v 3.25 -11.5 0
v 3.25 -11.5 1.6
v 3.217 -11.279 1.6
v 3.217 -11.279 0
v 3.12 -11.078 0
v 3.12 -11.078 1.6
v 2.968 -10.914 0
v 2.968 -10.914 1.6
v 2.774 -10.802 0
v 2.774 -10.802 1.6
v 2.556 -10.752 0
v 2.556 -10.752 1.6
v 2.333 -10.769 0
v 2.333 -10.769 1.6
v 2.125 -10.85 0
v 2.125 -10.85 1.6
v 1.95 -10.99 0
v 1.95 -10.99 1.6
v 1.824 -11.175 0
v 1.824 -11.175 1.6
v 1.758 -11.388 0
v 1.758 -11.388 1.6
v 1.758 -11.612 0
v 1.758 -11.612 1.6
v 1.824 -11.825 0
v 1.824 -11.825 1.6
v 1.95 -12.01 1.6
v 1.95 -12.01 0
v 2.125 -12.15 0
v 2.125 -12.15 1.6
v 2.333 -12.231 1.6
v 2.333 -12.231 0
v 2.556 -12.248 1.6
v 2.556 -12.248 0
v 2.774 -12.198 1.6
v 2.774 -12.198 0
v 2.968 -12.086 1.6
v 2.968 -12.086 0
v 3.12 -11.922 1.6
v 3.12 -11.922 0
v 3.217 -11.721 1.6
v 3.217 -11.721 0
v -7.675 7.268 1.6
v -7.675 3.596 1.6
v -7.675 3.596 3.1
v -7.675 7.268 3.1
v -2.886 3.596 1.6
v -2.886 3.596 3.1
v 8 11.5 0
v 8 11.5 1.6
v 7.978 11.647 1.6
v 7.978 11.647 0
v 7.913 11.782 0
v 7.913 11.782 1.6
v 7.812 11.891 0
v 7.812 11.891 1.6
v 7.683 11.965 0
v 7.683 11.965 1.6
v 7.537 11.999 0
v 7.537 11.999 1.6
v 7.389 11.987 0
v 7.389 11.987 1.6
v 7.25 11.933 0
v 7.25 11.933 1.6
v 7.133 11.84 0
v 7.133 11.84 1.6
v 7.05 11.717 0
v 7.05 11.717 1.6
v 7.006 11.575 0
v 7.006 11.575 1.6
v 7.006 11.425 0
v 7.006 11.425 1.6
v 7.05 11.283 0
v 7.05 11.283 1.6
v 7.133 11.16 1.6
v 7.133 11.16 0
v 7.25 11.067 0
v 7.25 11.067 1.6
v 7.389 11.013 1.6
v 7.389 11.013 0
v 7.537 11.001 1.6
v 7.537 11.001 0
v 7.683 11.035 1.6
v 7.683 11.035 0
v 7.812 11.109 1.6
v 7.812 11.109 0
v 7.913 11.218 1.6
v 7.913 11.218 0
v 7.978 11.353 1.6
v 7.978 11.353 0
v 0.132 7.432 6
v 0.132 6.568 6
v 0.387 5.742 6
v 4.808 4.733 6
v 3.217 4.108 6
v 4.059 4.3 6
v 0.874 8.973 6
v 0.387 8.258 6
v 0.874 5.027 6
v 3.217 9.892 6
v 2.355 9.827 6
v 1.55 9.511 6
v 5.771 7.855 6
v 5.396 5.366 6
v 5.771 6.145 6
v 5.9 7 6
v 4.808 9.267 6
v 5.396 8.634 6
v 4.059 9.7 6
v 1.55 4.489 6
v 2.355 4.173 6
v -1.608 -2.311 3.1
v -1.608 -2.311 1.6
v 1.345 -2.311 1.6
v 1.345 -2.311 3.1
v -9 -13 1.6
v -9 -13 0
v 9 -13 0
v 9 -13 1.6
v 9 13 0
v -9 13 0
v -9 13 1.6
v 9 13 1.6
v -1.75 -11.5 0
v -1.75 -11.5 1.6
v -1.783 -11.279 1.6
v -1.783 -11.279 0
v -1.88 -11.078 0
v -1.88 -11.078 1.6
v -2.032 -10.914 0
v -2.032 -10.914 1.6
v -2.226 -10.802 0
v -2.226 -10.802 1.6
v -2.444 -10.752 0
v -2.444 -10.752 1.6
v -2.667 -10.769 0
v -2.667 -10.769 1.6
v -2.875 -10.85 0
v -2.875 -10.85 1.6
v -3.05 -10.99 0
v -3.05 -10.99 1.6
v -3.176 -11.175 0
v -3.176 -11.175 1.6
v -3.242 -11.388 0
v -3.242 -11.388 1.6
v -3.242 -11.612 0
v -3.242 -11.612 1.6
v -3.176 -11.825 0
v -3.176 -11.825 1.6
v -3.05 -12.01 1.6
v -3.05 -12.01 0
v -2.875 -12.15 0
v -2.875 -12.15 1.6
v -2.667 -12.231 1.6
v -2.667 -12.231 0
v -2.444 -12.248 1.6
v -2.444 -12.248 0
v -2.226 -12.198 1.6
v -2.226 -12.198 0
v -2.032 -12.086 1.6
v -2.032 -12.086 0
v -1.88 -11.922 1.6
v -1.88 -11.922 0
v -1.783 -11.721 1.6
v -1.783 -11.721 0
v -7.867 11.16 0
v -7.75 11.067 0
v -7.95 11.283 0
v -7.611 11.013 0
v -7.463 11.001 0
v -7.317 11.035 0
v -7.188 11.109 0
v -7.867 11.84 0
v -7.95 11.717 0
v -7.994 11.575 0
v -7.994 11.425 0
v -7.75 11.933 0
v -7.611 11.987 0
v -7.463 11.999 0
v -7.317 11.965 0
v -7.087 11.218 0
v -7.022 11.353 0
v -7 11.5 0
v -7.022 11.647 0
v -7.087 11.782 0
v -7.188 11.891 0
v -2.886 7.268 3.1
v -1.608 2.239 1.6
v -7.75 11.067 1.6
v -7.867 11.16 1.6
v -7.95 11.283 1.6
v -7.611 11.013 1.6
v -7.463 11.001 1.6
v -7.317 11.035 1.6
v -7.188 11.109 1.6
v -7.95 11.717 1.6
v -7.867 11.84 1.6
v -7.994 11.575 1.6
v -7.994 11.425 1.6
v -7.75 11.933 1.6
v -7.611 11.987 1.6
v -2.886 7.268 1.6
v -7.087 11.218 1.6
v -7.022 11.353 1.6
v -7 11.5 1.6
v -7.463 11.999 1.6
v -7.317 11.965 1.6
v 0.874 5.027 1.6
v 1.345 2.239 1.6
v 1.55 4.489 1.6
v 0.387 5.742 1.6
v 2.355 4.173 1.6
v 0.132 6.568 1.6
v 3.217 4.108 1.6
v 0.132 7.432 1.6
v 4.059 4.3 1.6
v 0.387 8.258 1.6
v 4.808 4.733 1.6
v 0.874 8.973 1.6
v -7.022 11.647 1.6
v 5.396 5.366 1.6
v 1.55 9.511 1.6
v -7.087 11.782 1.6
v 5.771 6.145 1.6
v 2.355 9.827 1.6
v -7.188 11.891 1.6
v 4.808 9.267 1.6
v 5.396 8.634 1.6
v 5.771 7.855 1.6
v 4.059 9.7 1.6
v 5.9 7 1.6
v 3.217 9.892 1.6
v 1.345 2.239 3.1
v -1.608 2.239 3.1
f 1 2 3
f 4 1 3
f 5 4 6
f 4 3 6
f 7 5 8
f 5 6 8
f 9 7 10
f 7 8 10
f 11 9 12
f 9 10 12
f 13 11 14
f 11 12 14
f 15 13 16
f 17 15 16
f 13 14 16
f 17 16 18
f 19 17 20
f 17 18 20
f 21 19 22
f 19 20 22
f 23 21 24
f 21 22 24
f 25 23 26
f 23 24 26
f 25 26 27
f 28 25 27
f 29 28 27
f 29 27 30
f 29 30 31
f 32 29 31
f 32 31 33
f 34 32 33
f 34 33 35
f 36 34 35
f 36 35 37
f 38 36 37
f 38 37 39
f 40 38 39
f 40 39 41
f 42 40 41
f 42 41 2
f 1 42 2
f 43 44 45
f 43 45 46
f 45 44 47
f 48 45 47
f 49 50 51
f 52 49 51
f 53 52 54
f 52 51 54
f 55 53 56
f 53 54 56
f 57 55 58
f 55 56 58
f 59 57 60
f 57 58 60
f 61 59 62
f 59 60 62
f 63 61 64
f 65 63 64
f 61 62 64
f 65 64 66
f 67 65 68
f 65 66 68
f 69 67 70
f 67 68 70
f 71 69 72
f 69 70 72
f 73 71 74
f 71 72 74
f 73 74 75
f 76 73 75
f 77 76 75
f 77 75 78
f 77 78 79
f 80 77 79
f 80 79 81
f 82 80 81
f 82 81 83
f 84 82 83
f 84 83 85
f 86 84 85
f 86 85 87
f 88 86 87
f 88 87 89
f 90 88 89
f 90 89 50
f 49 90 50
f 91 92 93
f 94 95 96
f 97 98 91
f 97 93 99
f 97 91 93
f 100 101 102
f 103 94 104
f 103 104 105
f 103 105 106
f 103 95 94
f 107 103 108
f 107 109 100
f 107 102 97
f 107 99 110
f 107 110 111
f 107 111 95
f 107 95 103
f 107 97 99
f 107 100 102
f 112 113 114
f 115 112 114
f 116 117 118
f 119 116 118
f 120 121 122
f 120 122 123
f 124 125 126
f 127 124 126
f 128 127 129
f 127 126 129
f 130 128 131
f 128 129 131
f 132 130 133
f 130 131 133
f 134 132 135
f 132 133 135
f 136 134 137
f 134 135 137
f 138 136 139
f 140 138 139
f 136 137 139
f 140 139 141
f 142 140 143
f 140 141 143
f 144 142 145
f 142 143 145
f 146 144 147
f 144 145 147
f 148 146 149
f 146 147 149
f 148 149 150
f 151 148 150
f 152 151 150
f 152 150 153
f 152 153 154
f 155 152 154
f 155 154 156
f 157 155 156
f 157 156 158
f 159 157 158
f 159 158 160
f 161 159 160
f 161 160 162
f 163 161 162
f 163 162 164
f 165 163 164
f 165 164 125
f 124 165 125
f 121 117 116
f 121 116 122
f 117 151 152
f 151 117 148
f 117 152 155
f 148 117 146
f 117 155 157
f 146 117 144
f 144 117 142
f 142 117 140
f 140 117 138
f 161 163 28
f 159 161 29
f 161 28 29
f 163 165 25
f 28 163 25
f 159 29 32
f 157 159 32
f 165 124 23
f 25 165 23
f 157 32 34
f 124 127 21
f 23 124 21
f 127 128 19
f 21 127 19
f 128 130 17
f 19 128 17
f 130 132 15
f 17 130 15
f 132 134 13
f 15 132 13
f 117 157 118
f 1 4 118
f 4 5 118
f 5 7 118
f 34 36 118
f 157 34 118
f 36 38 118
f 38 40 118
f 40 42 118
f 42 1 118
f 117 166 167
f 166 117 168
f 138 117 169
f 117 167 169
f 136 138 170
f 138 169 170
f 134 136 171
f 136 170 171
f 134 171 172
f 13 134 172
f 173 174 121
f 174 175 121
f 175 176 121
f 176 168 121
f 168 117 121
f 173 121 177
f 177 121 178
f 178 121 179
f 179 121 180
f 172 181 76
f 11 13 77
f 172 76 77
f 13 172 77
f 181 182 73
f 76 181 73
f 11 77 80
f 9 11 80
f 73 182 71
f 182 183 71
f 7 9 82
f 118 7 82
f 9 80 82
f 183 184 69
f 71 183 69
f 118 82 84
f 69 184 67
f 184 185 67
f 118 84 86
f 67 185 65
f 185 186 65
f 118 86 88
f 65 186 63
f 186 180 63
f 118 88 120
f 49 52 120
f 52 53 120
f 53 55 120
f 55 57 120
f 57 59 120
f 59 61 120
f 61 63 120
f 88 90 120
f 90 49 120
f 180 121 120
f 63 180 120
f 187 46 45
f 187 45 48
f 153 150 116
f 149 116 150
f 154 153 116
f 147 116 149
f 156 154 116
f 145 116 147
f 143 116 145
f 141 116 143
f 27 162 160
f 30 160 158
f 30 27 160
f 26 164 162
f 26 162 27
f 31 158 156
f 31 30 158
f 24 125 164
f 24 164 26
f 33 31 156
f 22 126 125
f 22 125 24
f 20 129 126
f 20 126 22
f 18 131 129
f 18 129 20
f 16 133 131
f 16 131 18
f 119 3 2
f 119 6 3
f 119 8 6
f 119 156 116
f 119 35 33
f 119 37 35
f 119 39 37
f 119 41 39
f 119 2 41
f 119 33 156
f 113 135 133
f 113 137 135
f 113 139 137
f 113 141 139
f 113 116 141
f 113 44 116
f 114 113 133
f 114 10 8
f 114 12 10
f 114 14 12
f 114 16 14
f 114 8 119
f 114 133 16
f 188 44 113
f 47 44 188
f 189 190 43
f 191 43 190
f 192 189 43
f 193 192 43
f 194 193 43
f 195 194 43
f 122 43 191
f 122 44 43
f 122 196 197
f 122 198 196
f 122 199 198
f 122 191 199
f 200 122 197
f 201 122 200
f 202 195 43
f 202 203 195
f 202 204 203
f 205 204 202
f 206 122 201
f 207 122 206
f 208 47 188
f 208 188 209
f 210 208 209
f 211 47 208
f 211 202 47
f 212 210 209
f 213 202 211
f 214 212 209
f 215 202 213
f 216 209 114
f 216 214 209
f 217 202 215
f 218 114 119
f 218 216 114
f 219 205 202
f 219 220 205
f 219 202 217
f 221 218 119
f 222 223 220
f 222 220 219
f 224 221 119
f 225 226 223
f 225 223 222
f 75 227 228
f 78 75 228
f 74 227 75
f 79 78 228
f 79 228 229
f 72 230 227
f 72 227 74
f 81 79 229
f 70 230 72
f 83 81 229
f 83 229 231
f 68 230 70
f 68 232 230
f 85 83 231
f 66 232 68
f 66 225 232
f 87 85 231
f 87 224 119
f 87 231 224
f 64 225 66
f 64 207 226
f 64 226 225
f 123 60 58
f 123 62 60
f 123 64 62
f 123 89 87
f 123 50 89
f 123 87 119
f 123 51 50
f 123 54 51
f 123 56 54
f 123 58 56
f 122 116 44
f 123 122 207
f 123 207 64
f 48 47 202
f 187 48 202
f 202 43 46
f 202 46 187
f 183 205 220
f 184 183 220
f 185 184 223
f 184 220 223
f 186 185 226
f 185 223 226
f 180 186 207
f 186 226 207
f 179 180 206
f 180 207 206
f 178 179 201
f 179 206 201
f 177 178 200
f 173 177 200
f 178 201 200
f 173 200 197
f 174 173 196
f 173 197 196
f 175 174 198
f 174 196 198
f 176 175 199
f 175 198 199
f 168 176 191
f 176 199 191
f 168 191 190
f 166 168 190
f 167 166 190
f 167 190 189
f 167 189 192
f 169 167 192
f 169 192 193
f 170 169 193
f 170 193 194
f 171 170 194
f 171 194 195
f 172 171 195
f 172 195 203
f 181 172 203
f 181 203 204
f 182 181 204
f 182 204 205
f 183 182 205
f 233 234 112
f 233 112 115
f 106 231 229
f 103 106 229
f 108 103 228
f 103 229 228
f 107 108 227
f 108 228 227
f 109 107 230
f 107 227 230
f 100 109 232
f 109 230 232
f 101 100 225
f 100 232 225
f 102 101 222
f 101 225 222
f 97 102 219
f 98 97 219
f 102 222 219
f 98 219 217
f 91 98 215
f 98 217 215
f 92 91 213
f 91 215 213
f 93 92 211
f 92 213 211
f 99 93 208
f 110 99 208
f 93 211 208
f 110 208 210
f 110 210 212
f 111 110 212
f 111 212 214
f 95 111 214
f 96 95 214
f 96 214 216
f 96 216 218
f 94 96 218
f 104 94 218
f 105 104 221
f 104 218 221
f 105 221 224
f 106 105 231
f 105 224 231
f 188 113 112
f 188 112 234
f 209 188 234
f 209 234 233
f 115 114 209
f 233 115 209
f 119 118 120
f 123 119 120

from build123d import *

# Parameters (mm, degrees)
F0_W     = 18
F0_H     = 26
F1_DEPTH = 1.6
F2_R     = 2.9
F3_DEPTH = 4.4
F4_W     = 4.789572
F4_H     = 3.672005
F4_W_2   = 2.95357
F4_H_2   = 4.550093
F5_DEPTH = 1.5
F6_R     = 0.75
F6_R_2   = 0.5
F7_DEPTH = 25


with BuildPart() as f1:
    # F0 (on Top) → F1 (new body)
    with BuildSketch(Plane.XY):
        Rectangle(F0_W, F0_H)
    extrude(amount=F1_DEPTH)

    # F2 (on face) → F3 (join)
    with BuildSketch(Plane.XY.offset(1.6)):
        with Locations((3, 7)):
            Circle(F2_R)
    extrude(amount=F3_DEPTH)

    # F4 (on face) → F5 (join)
    with BuildSketch(Plane.XY.offset(1.6)):
        with Locations((-5.280366, 5.431945)):
            Rectangle(F4_W, F4_H)
        with Locations((-0.131576, -0.03615)):
            Rectangle(F4_W_2, F4_H_2)
    extrude(amount=F5_DEPTH)

    # F6 (on face) → F7 (cut)
    with BuildSketch(Plane.XY.offset(1.6)):
        with Locations((-2.5, -11.5)):
            Circle(F6_R)
        with Locations((2.5, -11.5)):
            Circle(F6_R)
        with Locations((7.5, 11.5)):
            Circle(F6_R_2)
        with Locations((-7.5, 11.5)):
            Circle(F6_R_2)
    extrude(amount=-F7_DEPTH, mode=Mode.SUBTRACT)


solid = f1.part
